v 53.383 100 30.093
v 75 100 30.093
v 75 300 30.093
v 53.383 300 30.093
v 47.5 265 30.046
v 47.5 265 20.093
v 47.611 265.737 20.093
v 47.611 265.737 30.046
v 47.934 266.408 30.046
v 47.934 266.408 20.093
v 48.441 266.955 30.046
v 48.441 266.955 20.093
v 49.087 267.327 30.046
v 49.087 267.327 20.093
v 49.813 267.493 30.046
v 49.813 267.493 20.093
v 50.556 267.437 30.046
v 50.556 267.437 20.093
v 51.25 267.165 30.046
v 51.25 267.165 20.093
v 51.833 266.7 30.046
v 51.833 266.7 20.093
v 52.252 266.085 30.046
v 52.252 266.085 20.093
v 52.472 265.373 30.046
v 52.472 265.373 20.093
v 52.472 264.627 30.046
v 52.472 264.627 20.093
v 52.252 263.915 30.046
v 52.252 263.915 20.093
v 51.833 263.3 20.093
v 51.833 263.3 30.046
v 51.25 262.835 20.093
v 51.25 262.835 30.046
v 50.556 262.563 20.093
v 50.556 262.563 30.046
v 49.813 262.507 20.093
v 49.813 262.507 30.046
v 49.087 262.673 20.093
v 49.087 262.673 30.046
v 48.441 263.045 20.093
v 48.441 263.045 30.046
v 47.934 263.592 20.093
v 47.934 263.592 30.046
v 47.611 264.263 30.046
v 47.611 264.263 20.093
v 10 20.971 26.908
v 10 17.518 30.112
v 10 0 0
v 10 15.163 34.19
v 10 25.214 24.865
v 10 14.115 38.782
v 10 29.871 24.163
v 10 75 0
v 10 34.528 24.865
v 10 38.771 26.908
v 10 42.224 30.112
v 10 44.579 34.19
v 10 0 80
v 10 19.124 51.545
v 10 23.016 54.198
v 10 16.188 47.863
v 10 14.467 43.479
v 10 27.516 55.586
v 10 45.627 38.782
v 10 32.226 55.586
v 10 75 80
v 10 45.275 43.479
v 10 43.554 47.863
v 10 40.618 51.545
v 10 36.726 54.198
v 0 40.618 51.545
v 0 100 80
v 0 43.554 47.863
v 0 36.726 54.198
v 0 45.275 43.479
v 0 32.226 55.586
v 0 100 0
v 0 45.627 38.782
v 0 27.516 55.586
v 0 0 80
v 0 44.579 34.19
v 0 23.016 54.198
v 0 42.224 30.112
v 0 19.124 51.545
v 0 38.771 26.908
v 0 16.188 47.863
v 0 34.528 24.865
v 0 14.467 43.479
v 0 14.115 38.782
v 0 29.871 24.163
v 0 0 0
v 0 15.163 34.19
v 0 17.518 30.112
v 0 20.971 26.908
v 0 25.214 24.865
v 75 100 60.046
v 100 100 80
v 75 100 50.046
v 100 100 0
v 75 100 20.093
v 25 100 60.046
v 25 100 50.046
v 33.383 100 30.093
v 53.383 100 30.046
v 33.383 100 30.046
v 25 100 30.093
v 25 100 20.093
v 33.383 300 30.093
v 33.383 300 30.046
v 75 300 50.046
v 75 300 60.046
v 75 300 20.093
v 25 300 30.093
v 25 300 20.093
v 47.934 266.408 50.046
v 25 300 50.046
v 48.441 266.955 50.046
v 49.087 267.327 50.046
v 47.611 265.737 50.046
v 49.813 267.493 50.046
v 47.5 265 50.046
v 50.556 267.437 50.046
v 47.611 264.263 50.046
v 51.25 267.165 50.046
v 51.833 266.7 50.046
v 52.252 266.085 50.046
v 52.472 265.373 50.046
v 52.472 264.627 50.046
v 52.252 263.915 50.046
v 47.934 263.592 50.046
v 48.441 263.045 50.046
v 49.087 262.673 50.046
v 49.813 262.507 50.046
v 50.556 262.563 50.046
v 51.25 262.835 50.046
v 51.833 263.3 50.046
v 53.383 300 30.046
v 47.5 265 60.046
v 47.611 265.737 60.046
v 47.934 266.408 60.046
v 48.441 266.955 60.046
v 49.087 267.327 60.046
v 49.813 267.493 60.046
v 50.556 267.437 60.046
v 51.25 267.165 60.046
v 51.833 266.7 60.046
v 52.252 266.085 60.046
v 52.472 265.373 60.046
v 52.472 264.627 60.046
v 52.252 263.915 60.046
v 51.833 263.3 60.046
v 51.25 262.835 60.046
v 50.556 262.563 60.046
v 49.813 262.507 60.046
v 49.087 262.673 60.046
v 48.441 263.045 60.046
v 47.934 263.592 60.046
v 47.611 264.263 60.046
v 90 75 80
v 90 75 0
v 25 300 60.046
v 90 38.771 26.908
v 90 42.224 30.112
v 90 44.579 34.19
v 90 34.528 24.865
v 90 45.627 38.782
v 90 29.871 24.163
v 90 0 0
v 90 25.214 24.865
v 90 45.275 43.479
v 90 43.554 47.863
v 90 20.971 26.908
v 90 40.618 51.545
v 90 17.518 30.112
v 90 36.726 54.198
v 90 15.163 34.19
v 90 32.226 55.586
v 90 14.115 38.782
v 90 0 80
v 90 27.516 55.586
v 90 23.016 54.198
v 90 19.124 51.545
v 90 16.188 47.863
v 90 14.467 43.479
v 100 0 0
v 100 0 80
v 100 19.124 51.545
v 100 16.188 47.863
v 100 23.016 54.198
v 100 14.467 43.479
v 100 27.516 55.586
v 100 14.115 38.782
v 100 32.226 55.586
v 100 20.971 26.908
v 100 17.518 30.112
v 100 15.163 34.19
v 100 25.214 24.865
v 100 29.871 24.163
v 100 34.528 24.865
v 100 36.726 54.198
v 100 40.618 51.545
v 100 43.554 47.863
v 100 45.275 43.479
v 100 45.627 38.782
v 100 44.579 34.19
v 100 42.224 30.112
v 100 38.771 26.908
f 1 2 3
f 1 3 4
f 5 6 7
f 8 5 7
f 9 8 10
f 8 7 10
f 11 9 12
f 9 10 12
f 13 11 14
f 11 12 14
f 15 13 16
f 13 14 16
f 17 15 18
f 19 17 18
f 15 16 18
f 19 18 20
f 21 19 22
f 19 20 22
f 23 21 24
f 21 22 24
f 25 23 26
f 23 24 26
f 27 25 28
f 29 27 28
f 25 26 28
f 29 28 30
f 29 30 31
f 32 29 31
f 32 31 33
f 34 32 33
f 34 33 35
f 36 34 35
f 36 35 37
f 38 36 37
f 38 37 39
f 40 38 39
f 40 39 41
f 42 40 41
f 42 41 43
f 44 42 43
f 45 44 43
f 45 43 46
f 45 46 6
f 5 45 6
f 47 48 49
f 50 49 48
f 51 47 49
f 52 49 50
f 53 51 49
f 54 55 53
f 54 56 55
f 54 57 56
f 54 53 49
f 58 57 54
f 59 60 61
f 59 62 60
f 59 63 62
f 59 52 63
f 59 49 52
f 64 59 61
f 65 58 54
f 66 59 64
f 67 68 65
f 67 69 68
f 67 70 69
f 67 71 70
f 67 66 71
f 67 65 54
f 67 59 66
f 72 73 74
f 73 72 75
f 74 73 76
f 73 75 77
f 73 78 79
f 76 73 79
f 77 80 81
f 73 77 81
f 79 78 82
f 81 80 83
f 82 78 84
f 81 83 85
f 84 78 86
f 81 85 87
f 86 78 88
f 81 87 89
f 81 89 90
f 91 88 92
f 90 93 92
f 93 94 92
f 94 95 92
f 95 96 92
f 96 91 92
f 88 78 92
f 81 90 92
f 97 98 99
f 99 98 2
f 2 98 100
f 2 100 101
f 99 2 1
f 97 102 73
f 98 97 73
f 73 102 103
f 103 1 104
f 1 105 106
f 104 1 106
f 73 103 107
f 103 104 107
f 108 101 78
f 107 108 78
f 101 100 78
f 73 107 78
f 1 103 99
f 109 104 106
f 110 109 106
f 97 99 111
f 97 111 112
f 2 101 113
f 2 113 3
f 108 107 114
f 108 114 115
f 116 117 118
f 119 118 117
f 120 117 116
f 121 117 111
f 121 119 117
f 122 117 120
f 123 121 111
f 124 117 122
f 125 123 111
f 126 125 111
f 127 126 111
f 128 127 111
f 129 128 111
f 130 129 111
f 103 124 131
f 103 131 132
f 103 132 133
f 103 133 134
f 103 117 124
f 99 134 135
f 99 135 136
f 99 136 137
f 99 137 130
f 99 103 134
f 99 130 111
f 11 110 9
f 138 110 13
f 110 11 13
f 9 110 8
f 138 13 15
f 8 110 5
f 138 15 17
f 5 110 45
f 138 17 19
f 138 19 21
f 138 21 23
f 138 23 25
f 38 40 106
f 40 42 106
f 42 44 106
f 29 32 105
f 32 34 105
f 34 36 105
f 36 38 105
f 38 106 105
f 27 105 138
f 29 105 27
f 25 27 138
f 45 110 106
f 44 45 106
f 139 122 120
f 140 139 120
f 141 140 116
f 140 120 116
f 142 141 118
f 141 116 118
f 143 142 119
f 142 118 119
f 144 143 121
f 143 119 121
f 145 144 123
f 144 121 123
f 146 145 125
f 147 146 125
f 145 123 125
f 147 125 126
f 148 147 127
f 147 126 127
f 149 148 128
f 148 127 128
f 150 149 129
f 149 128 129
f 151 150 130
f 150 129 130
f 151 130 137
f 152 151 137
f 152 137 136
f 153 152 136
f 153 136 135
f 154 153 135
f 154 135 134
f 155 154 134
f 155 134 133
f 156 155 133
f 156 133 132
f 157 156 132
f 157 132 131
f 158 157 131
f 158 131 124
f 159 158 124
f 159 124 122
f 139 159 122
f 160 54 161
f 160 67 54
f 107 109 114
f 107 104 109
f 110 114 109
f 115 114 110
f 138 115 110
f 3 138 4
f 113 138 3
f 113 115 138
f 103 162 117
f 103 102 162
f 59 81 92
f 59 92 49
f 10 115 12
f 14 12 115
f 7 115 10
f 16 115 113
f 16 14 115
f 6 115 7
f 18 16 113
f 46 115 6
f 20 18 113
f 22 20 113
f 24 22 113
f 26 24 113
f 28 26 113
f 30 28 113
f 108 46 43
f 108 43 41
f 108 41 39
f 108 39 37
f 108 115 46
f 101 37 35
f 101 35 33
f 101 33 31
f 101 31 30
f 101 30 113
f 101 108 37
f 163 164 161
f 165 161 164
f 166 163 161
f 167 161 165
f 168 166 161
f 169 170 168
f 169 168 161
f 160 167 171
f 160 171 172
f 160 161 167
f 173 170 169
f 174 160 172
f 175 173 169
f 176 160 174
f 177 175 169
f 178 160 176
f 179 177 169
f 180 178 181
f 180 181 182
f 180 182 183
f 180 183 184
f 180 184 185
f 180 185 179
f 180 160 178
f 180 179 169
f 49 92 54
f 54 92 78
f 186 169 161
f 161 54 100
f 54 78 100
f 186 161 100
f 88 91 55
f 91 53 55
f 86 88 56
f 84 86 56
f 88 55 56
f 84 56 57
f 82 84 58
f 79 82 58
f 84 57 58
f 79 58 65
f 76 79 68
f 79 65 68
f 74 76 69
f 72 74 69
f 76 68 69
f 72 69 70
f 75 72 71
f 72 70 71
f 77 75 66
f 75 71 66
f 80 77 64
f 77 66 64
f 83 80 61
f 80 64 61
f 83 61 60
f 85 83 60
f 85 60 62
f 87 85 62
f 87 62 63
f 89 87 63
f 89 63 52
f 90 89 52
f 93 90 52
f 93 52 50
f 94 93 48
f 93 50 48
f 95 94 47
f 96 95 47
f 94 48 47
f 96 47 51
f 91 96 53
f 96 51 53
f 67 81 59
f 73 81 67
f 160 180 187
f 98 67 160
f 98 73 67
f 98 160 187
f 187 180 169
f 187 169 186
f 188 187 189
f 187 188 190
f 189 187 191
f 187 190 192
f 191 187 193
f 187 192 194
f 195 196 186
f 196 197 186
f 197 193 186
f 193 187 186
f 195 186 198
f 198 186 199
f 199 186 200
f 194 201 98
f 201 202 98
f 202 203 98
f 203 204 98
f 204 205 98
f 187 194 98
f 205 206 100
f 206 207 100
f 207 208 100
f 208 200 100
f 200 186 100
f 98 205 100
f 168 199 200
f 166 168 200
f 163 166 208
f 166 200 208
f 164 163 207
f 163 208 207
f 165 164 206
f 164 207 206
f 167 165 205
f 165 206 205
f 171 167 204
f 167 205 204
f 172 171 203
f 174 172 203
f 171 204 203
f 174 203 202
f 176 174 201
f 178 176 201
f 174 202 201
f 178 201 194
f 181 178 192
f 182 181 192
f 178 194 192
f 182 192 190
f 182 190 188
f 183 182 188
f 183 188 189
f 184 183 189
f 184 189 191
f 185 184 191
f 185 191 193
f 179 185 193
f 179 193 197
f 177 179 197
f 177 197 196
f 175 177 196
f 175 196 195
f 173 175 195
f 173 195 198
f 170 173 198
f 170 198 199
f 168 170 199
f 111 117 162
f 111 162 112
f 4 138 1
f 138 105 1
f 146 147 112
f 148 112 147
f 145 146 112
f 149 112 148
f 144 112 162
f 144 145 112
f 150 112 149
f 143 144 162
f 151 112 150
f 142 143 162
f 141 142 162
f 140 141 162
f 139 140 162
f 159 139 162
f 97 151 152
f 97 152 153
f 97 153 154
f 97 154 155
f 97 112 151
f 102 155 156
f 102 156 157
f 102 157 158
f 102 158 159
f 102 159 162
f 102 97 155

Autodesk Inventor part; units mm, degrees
ref_plane "YZ Plane" through (0, 0, 0) normal (1, 0, 0) x (0, 1, 0)
ref_plane "XZ Plane" through (0, 0, 0) normal (0, 1, 0) x (-1, 0, 0)
ref_plane "XY Plane" through (0, 0, 0) normal (0, 0, 1) x (1, 0, 0)
sketch "Sketch1" plane through (0, 0, 0) normal (0, 0, 1) x (1, 0, 0)
  line L0 (0, 0) -> (100, 0)
  line L1 (100, 0) -> (100, 100)
  line L2 (100, 100) -> (0, 100)
  line L3 (0, 100) -> (0, 0)
  dimension "d0" = 100
  dimension "d1" = 100
extrude "Extrusion1" add sketch "Sketch1" along normal blind 80
sketch "Sketch2" plane through (0, 0, 80) normal (0, 0, 1) x (1, 0, 0)
  line L0 (0, 100) -> (0, 0) projected
  line L1 (0, 50) -> (10, 50)
  line L2 (100, 100) -> (0, 100) projected
  line L3 (50, 100) -> (50, 75)
  line L4 (100, 0) -> (100, 100) projected
  line L5 (100, 53.1095) -> (100, 43.1095)
  line L6 (100, 43.1095) -> (90, 43.1095)
  line L7 (0, 0) -> (100, 0) projected
  line L8 (10, 75) -> (90, 75)
  line L9 (90, 75) -> (90, 0)
  line L10 (90, 0) -> (10, 0)
  line L11 (10, 0) -> (10, 75)
  dimension "d4" = 10
  dimension "d5" = 25
  dimension "d6" = 10
  dimension "d7" = 10
extrude "Extrusion2" cut sketch "Sketch2" against normal blind 80 contours L11 L8 L9 L7
sketch "Sketch3" plane through (0, 100, 0) normal (0, 1, 0) x (1, 0, 0)
  line L0 (90, 0) -> (10, 0) projected
  line L1 (32.4733, 0) -> (52.4733, 0)
  line L2 (52.4733, 0) -> (52.4733, -20)
  line L3 (10, -80) -> (90, -80) projected
  line L4 (70.0717, -80) -> (50.0717, -80)
  line L5 (50.0717, -80) -> (50.0717, -60)
  point P0 (0, 0)
  dimension "d10" = 20
  dimension "d11" = 20
  dimension "d12" = 20
  dimension "d13" = 20
sketch "Sketch4" plane through (0, 100, 0) normal (0, 1, 0) x (1, 0, 0)
  line L0 (0, 0) -> (0, -80) projected
  line L1 (0, -49.1237) -> (0, -24.1237)
  line L2 (0, -24.1237) -> (25, -24.1237)
  line L3 (100, 0) -> (100, -80) projected
  line L4 (100, -53.0628) -> (100, -28.0628)
  line L5 (100, -28.0628) -> (75, -28.0628)
  line L6 (25, -20.093) -> (75, -20.093)
  line L7 (75, -20.093) -> (75, -30.093)
  line L8 (75, -30.093) -> (25, -30.093)
  line L9 (25, -30.093) -> (25, -20.093)
  line L10 (33.3829, -30.093) -> (33.3829, -30.0462)
  line L11 (33.3829, -30.0462) -> (53.3829, -30.0462)
  line L12 (53.3829, -30.0462) -> (53.3829, -50.0462)
  line L13 (25, -50.0462) -> (75, -50.0462)
  line L14 (75, -50.0462) -> (75, -60.0462)
  line L15 (75, -60.0462) -> (25, -60.0462)
  line L16 (25, -60.0462) -> (25, -50.0462)
  point P0 (53.3829, -30.093)
  dimension "d14" = 25
  dimension "d15" = 25
  dimension "d16" = 90
  dimension "d18" = 25
  dimension "d19" = 90
  dimension "d20" = 50
  dimension "d21" = 10
  dimension "d22" = 20
  dimension "d23" = 20
  dimension "d24" = 50
  dimension "d25" = 10
extrude "Extrusion3" add sketch "Sketch4" along normal blind 200 contours L13 L14 L15 L16 | L6 L7 L8 L12 L11 L10 L9
sketch "Sketch5" plane through (75, 100, 20.093) normal (0, 0, -1) x (-1, 0, 0)
  point P0 (75, -100)
sketch "Sketch6" plane through (75, 100, 20.093) normal (0, 0, -1) x (-1, 0, 0)
  line L0 (0, 0) -> (0, 200) projected
  line L1 (0, 200) -> (25, 200)
  line L2 (21.6171, 200) -> (0, 200) projected
  line L3 (25, 200) -> (25, 165)
  circle A0 centre (25, 165) radius 2.5
  point P0 (75, -100)
  dimension "d28" = 25
  dimension "d29" = 35
  dimension "d30" = 5
extrude "Extrusion4" cut sketch "Sketch6" against normal blind 200
sketch "Sketch7" plane through (100, 0, 0) normal (1, 0, 0) x (0, 0, -1)
  line L0 (0, 0) -> (-80, 0) projected
  line L1 (-40, 0) -> (-40, 14)
  line L2 (-40, 0) -> (-40, 29.8709)
  line L3 (-39.9627, -1.129) -> (-39.9627, 29.871)
  circle A0 centre (-39.9627, 29.871) radius 15.8
  dimension "d33" = 14
  dimension "d34" = 31
  dimension "d35" = 31
  dimension "d36" = 31.6
extrude "Extrusion5" cut sketch "Sketch7" against normal blind 200 contours A0
properties part number "S.Platform"
